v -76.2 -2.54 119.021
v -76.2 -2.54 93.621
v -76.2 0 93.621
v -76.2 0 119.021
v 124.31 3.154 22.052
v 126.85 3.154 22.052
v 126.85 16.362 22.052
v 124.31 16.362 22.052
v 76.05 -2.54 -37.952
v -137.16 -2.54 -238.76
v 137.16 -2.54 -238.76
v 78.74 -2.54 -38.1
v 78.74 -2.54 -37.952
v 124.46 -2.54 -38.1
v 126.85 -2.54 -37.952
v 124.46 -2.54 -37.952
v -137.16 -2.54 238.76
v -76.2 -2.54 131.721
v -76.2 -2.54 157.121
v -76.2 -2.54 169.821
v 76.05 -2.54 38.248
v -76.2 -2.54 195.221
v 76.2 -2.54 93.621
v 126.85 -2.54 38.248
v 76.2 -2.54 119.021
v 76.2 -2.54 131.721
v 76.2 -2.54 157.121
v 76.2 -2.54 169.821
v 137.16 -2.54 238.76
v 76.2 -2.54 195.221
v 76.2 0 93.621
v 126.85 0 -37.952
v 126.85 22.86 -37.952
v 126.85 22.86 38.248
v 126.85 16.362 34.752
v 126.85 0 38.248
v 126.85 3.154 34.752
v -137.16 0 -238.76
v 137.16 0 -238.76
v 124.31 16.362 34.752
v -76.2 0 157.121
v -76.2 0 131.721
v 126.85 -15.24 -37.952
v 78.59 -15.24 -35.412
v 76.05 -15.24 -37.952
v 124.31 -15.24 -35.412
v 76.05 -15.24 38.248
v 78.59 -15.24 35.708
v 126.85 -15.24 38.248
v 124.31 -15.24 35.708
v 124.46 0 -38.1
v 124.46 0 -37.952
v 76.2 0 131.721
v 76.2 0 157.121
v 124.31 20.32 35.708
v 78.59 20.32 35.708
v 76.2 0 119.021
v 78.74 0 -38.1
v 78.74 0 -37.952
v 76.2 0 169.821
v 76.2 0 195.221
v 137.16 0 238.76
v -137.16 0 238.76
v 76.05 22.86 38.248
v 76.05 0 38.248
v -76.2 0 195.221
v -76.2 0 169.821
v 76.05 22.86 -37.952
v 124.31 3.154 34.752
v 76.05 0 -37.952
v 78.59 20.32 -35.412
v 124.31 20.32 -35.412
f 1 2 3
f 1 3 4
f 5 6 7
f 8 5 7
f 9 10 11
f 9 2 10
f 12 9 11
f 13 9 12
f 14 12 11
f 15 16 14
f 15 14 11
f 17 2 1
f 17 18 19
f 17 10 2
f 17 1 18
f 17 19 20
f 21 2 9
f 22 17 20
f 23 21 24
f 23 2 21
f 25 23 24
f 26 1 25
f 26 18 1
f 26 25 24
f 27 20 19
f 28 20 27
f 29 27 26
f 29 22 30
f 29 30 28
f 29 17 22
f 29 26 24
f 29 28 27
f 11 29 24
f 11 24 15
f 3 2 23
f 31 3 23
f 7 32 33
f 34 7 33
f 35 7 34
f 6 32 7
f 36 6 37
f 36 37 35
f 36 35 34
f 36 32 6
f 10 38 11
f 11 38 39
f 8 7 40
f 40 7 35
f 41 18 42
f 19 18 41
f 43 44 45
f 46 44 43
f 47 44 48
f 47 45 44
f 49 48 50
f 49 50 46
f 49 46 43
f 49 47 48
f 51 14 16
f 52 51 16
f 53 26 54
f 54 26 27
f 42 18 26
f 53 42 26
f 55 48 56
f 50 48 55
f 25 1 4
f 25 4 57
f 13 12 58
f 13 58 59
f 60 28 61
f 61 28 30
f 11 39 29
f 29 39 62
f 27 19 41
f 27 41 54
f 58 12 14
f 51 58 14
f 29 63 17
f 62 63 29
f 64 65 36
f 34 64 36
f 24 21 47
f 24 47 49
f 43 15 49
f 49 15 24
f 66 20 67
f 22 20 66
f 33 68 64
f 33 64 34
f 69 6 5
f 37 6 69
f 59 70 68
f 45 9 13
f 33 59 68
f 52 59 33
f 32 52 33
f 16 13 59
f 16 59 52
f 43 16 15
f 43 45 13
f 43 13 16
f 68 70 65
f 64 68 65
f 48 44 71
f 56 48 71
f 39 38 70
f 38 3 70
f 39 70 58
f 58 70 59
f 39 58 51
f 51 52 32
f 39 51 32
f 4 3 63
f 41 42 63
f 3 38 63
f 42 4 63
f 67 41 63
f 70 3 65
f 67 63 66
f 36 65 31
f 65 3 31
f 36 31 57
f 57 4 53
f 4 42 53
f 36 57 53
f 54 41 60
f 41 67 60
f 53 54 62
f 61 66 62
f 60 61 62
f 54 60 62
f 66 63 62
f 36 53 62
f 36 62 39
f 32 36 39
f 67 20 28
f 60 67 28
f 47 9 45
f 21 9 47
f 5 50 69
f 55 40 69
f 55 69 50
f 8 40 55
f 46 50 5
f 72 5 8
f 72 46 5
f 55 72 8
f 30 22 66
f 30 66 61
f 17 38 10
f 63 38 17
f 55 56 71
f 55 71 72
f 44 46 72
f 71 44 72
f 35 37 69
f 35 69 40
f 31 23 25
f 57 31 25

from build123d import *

# Parameters (mm, degrees)
F0_W          = 274.32
F0_H          = 477.52
F1_DEPTH      = 2.54
F2_W          = 152.4
F2_H          = 25.4
F3_W          = 152.4
F3_H          = 25.4
F4_W          = 152.4
F4_H          = 25.4
F5_DEPTH      = 25.4
F6_W          = 45.72
F6_H          = 76.2
F7_DEPTH      = 25.4
F8_W          = 50.8
F8_H          = 76.2
F9_DEPTH      = 12.7
F9_DEPTH_BACK = 25.4
F10_T         = 2.54
F10_T3_DEPTH  = 7.4696609569
F10_T5_DEPTH  = 81.28
F10_T7_DEPTH  = 55.88
F10_T9_DEPTH  = 7.7703390431
F10_T11_DEPTH = 7.62
F11_W         = 13.208
F11_H         = 12.7
F12_DEPTH     = 25.4


# Not quite as in the source:
# - a shell that OpenCascade refuses in one call is made with other operations: the cavity is built on its own and cut out


with BuildPart() as f1:
    # F0 (on Front) → F1 (new body)
    with BuildSketch(Plane.XZ):
        Rectangle(F0_W, F0_H)
    extrude(amount=F1_DEPTH)

    # F2 (on face) + F3 (on face) + F4 (on face) → F5 (cut)
    with BuildSketch(Plane.XZ.offset(2.54)):
        with Locations((0, 182.5210501183)):
            Rectangle(F2_W, F2_H)
    with BuildSketch(Plane.XZ.offset(2.54)):
        with Locations((0, 144.4210501183)):
            Rectangle(F3_W, F3_H)
    with BuildSketch(Plane.XZ.offset(2.54)):
        with Locations((0, 106.3210501183)):
            Rectangle(F4_W, F4_H)
    extrude(amount=-F5_DEPTH, mode=Mode.SUBTRACT)

    # F6 (on face) → F7 (cut)
    with BuildSketch(Plane.XZ.offset(2.54)):
        with Locations((101.6, 0)):
            Rectangle(F6_W, F6_H)
    extrude(amount=-F7_DEPTH, mode=Mode.SUBTRACT)

    # F8 (on face) → F9 (join, two sides)
    with BuildSketch(Plane.XZ.offset(2.54)) as f9_sk:
        with Locations((101.4496609569, 0.1478558406)):
            Rectangle(F8_W, F8_H)
    extrude(amount=F9_DEPTH)
    extrude(f9_sk.sketch, amount=-F9_DEPTH_BACK)

    # F10: shell of thickness 2.54, made by hand


with BuildPart() as f10_core1:
    # F10_t2: copy of F1
    add(f1.part)

    # the walls: a layer under each face that stays
    f10_faces = [f10_core1.faces().sort_by_distance(p)[0] for p in [
        (0, -1.27, 238.76),
        (137.16, -1.27, 0),
        (-137.16, -1.27, 0),
        (0, 0, 0),
        (0, -2.54, 0),
        (0, -1.27, -238.76),
        (101.6, -1.27, -38.1),
        (124.46, -1.27, -38.0260720797),
        (101.4496609569, 3.81, -37.9521441594),
        (126.8496609569, 11.43, 0.1478558406),
        (101.4496609569, 11.43, 38.2478558406),
        (76.0496609569, 11.43, 0.1478558406),
        (78.74, -1.27, -38.0260720797),
        (-76.2, -1.27, 106.3210501183),
        (0, -1.27, 119.0210501183),
        (0, -1.27, 93.6210501183),
        (76.2, -1.27, 106.3210501183),
        (0, -1.27, 131.7210501183),
        (-76.2, -1.27, 144.4210501183),
        (76.2, -1.27, 144.4210501183),
        (0, -1.27, 157.1210501183),
        (0, -1.27, 169.8210501183),
        (-76.2, -1.27, 182.5210501183),
        (76.2, -1.27, 182.5210501183),
        (0, -1.27, 195.2210501183),
        (126.8496609569, -8.89, 0.1478558406),
        (101.4496609569, -8.89, 38.2478558406),
        (76.0496609569, -8.89, 0.1478558406),
        (101.4496609569, 22.86, 0.1478558406),
    ]]
    thicken(f10_faces, amount=-F10_T, mode=Mode.SUBTRACT)

    # F10_s4 → F10_t3 (cut)
    with BuildSketch(Plane.YZ.offset(121.92)):
        Polygon((0.0254, -37.9775441594), (-2.54, -37.9521441594), (-2.54, -35.4121441594), (0, -35.4121441594), align=None)
        Polygon((-2.5654, -37.9775441594), (0, -37.9521441594), (0, -35.4121441594), (-2.54, -35.4121441594), align=None)
    extrude(amount=F10_T3_DEPTH, mode=Mode.SUBTRACT)

    # F10_s6 → F10_t5 (cut)
    with BuildSketch(Plane.XY.offset(-40.4921441594)):
        Polygon((126.8750609569, 0.0254), (126.8496609569, -2.54), (124.3096609569, -2.54), (124.3096609569, 0), align=None)
        Polygon((76.0242609569, 0.0254), (76.0496609569, -2.54), (78.5896609569, -2.54), (78.5896609569, 0), align=None)
        Polygon((126.8750609569, -2.5654), (126.8496609569, 0), (124.3096609569, 0), (124.3096609569, -2.54), align=None)
        Polygon((76.0242609569, -2.5654), (76.0496609569, 0), (78.5896609569, 0), (78.5896609569, -2.54), align=None)
    extrude(amount=F10_T5_DEPTH, mode=Mode.SUBTRACT)

    # F10_s8 → F10_t7 (cut)
    with BuildSketch(Plane.YZ.offset(73.5096609569)):
        Polygon((0.0254, 38.2732558406), (-2.54, 38.2478558406), (-2.54, 35.7078558406), (0, 35.7078558406), align=None)
        Polygon((-2.5654, 38.2732558406), (0, 38.2478558406), (0, 35.7078558406), (-2.54, 35.7078558406), align=None)
    extrude(amount=F10_T7_DEPTH, mode=Mode.SUBTRACT)

    # F10_s10 → F10_t9 (cut)
    with BuildSketch(Plane.YZ.offset(73.5096609569)):
        Polygon((0.0254, -37.9775441594), (-2.54, -37.9521441594), (-2.54, -35.4121441594), (0, -35.4121441594), align=None)
        Polygon((-2.5654, -37.9775441594), (0, -37.9521441594), (0, -35.4121441594), (-2.54, -35.4121441594), align=None)
    extrude(amount=F10_T9_DEPTH, mode=Mode.SUBTRACT)

    # F10_s12 → F10_t11 (cut)
    with BuildSketch(Plane.XZ.offset(-2.54)):
        Polygon((124.4346, -38.0746), (124.46, -40.64), (127, -40.64), (127, -38.1), align=None)
        Polygon((78.7654, -38.0746), (78.74, -40.64), (76.2, -40.64), (76.2, -38.1), align=None)
        Polygon((124.4346, -37.9775441594), (127, -37.9521441594), (127, -35.4121441594), (124.46, -35.4121441594), align=None)
        Polygon((78.7654, -37.9775441594), (78.74, -35.4121441594), (76.2, -35.4121441594), (76.2, -37.9521441594), align=None)
        Polygon((-76.1746, 93.6464501183), (-78.74, 93.6210501183), (-78.74, 91.0810501183), (-76.2, 91.0810501183), align=None)
        Polygon((-76.1746, 118.9956501183), (-78.74, 119.0210501183), (-78.74, 121.5610501183), (-76.2, 121.5610501183), align=None)
        Polygon((76.1746, 118.9956501183), (76.2, 121.5610501183), (78.74, 121.5610501183), (78.74, 119.0210501183), align=None)
        Polygon((76.1746, 93.6464501183), (76.2, 91.0810501183), (78.74, 91.0810501183), (78.74, 93.6210501183), align=None)
        Polygon((76.1746, 131.7464501183), (76.2, 129.1810501183), (78.74, 129.1810501183), (78.74, 131.7210501183), align=None)
        Polygon((-76.1746, 131.7464501183), (-76.2, 129.1810501183), (-78.74, 129.1810501183), (-78.74, 131.7210501183), align=None)
        Polygon((-76.1746, 157.0956501183), (-78.74, 157.1210501183), (-78.74, 159.6610501183), (-76.2, 159.6610501183), align=None)
        Polygon((76.1746, 157.0956501183), (78.74, 157.1210501183), (78.74, 159.6610501183), (76.2, 159.6610501183), align=None)
        Polygon((76.1746, 169.8464501183), (76.2, 167.2810501183), (78.74, 167.2810501183), (78.74, 169.8210501183), align=None)
        Polygon((-76.1746, 169.8464501183), (-76.2, 167.2810501183), (-78.74, 167.2810501183), (-78.74, 169.8210501183), align=None)
        Polygon((-76.1746, 195.1956501183), (-78.74, 195.2210501183), (-78.74, 197.7610501183), (-76.2, 197.7610501183), align=None)
        Polygon((76.1746, 195.1956501183), (78.74, 195.2210501183), (78.74, 197.7610501183), (76.2, 197.7610501183), align=None)
    extrude(amount=F10_T11_DEPTH, mode=Mode.SUBTRACT)


with BuildPart() as f1_1:
    add(f1.part)

    # what is left inside the walls is the cavity
    f10_cavity = [f10_core1.part.solids().sort_by_distance(p)[0] for p in [
        (101.449661, -15.2146, -11.705477),
    ]]
    add(f10_cavity, mode=Mode.SUBTRACT)

    # F11 (on face) → F12 (cut)
    with BuildSketch(Plane.YZ.offset(126.8496609569)):
        with Locations((9.7576510161, 28.402006929)):
            Rectangle(F11_W, F11_H)
    extrude(amount=-F12_DEPTH, mode=Mode.SUBTRACT)


solid = f1_1.part
